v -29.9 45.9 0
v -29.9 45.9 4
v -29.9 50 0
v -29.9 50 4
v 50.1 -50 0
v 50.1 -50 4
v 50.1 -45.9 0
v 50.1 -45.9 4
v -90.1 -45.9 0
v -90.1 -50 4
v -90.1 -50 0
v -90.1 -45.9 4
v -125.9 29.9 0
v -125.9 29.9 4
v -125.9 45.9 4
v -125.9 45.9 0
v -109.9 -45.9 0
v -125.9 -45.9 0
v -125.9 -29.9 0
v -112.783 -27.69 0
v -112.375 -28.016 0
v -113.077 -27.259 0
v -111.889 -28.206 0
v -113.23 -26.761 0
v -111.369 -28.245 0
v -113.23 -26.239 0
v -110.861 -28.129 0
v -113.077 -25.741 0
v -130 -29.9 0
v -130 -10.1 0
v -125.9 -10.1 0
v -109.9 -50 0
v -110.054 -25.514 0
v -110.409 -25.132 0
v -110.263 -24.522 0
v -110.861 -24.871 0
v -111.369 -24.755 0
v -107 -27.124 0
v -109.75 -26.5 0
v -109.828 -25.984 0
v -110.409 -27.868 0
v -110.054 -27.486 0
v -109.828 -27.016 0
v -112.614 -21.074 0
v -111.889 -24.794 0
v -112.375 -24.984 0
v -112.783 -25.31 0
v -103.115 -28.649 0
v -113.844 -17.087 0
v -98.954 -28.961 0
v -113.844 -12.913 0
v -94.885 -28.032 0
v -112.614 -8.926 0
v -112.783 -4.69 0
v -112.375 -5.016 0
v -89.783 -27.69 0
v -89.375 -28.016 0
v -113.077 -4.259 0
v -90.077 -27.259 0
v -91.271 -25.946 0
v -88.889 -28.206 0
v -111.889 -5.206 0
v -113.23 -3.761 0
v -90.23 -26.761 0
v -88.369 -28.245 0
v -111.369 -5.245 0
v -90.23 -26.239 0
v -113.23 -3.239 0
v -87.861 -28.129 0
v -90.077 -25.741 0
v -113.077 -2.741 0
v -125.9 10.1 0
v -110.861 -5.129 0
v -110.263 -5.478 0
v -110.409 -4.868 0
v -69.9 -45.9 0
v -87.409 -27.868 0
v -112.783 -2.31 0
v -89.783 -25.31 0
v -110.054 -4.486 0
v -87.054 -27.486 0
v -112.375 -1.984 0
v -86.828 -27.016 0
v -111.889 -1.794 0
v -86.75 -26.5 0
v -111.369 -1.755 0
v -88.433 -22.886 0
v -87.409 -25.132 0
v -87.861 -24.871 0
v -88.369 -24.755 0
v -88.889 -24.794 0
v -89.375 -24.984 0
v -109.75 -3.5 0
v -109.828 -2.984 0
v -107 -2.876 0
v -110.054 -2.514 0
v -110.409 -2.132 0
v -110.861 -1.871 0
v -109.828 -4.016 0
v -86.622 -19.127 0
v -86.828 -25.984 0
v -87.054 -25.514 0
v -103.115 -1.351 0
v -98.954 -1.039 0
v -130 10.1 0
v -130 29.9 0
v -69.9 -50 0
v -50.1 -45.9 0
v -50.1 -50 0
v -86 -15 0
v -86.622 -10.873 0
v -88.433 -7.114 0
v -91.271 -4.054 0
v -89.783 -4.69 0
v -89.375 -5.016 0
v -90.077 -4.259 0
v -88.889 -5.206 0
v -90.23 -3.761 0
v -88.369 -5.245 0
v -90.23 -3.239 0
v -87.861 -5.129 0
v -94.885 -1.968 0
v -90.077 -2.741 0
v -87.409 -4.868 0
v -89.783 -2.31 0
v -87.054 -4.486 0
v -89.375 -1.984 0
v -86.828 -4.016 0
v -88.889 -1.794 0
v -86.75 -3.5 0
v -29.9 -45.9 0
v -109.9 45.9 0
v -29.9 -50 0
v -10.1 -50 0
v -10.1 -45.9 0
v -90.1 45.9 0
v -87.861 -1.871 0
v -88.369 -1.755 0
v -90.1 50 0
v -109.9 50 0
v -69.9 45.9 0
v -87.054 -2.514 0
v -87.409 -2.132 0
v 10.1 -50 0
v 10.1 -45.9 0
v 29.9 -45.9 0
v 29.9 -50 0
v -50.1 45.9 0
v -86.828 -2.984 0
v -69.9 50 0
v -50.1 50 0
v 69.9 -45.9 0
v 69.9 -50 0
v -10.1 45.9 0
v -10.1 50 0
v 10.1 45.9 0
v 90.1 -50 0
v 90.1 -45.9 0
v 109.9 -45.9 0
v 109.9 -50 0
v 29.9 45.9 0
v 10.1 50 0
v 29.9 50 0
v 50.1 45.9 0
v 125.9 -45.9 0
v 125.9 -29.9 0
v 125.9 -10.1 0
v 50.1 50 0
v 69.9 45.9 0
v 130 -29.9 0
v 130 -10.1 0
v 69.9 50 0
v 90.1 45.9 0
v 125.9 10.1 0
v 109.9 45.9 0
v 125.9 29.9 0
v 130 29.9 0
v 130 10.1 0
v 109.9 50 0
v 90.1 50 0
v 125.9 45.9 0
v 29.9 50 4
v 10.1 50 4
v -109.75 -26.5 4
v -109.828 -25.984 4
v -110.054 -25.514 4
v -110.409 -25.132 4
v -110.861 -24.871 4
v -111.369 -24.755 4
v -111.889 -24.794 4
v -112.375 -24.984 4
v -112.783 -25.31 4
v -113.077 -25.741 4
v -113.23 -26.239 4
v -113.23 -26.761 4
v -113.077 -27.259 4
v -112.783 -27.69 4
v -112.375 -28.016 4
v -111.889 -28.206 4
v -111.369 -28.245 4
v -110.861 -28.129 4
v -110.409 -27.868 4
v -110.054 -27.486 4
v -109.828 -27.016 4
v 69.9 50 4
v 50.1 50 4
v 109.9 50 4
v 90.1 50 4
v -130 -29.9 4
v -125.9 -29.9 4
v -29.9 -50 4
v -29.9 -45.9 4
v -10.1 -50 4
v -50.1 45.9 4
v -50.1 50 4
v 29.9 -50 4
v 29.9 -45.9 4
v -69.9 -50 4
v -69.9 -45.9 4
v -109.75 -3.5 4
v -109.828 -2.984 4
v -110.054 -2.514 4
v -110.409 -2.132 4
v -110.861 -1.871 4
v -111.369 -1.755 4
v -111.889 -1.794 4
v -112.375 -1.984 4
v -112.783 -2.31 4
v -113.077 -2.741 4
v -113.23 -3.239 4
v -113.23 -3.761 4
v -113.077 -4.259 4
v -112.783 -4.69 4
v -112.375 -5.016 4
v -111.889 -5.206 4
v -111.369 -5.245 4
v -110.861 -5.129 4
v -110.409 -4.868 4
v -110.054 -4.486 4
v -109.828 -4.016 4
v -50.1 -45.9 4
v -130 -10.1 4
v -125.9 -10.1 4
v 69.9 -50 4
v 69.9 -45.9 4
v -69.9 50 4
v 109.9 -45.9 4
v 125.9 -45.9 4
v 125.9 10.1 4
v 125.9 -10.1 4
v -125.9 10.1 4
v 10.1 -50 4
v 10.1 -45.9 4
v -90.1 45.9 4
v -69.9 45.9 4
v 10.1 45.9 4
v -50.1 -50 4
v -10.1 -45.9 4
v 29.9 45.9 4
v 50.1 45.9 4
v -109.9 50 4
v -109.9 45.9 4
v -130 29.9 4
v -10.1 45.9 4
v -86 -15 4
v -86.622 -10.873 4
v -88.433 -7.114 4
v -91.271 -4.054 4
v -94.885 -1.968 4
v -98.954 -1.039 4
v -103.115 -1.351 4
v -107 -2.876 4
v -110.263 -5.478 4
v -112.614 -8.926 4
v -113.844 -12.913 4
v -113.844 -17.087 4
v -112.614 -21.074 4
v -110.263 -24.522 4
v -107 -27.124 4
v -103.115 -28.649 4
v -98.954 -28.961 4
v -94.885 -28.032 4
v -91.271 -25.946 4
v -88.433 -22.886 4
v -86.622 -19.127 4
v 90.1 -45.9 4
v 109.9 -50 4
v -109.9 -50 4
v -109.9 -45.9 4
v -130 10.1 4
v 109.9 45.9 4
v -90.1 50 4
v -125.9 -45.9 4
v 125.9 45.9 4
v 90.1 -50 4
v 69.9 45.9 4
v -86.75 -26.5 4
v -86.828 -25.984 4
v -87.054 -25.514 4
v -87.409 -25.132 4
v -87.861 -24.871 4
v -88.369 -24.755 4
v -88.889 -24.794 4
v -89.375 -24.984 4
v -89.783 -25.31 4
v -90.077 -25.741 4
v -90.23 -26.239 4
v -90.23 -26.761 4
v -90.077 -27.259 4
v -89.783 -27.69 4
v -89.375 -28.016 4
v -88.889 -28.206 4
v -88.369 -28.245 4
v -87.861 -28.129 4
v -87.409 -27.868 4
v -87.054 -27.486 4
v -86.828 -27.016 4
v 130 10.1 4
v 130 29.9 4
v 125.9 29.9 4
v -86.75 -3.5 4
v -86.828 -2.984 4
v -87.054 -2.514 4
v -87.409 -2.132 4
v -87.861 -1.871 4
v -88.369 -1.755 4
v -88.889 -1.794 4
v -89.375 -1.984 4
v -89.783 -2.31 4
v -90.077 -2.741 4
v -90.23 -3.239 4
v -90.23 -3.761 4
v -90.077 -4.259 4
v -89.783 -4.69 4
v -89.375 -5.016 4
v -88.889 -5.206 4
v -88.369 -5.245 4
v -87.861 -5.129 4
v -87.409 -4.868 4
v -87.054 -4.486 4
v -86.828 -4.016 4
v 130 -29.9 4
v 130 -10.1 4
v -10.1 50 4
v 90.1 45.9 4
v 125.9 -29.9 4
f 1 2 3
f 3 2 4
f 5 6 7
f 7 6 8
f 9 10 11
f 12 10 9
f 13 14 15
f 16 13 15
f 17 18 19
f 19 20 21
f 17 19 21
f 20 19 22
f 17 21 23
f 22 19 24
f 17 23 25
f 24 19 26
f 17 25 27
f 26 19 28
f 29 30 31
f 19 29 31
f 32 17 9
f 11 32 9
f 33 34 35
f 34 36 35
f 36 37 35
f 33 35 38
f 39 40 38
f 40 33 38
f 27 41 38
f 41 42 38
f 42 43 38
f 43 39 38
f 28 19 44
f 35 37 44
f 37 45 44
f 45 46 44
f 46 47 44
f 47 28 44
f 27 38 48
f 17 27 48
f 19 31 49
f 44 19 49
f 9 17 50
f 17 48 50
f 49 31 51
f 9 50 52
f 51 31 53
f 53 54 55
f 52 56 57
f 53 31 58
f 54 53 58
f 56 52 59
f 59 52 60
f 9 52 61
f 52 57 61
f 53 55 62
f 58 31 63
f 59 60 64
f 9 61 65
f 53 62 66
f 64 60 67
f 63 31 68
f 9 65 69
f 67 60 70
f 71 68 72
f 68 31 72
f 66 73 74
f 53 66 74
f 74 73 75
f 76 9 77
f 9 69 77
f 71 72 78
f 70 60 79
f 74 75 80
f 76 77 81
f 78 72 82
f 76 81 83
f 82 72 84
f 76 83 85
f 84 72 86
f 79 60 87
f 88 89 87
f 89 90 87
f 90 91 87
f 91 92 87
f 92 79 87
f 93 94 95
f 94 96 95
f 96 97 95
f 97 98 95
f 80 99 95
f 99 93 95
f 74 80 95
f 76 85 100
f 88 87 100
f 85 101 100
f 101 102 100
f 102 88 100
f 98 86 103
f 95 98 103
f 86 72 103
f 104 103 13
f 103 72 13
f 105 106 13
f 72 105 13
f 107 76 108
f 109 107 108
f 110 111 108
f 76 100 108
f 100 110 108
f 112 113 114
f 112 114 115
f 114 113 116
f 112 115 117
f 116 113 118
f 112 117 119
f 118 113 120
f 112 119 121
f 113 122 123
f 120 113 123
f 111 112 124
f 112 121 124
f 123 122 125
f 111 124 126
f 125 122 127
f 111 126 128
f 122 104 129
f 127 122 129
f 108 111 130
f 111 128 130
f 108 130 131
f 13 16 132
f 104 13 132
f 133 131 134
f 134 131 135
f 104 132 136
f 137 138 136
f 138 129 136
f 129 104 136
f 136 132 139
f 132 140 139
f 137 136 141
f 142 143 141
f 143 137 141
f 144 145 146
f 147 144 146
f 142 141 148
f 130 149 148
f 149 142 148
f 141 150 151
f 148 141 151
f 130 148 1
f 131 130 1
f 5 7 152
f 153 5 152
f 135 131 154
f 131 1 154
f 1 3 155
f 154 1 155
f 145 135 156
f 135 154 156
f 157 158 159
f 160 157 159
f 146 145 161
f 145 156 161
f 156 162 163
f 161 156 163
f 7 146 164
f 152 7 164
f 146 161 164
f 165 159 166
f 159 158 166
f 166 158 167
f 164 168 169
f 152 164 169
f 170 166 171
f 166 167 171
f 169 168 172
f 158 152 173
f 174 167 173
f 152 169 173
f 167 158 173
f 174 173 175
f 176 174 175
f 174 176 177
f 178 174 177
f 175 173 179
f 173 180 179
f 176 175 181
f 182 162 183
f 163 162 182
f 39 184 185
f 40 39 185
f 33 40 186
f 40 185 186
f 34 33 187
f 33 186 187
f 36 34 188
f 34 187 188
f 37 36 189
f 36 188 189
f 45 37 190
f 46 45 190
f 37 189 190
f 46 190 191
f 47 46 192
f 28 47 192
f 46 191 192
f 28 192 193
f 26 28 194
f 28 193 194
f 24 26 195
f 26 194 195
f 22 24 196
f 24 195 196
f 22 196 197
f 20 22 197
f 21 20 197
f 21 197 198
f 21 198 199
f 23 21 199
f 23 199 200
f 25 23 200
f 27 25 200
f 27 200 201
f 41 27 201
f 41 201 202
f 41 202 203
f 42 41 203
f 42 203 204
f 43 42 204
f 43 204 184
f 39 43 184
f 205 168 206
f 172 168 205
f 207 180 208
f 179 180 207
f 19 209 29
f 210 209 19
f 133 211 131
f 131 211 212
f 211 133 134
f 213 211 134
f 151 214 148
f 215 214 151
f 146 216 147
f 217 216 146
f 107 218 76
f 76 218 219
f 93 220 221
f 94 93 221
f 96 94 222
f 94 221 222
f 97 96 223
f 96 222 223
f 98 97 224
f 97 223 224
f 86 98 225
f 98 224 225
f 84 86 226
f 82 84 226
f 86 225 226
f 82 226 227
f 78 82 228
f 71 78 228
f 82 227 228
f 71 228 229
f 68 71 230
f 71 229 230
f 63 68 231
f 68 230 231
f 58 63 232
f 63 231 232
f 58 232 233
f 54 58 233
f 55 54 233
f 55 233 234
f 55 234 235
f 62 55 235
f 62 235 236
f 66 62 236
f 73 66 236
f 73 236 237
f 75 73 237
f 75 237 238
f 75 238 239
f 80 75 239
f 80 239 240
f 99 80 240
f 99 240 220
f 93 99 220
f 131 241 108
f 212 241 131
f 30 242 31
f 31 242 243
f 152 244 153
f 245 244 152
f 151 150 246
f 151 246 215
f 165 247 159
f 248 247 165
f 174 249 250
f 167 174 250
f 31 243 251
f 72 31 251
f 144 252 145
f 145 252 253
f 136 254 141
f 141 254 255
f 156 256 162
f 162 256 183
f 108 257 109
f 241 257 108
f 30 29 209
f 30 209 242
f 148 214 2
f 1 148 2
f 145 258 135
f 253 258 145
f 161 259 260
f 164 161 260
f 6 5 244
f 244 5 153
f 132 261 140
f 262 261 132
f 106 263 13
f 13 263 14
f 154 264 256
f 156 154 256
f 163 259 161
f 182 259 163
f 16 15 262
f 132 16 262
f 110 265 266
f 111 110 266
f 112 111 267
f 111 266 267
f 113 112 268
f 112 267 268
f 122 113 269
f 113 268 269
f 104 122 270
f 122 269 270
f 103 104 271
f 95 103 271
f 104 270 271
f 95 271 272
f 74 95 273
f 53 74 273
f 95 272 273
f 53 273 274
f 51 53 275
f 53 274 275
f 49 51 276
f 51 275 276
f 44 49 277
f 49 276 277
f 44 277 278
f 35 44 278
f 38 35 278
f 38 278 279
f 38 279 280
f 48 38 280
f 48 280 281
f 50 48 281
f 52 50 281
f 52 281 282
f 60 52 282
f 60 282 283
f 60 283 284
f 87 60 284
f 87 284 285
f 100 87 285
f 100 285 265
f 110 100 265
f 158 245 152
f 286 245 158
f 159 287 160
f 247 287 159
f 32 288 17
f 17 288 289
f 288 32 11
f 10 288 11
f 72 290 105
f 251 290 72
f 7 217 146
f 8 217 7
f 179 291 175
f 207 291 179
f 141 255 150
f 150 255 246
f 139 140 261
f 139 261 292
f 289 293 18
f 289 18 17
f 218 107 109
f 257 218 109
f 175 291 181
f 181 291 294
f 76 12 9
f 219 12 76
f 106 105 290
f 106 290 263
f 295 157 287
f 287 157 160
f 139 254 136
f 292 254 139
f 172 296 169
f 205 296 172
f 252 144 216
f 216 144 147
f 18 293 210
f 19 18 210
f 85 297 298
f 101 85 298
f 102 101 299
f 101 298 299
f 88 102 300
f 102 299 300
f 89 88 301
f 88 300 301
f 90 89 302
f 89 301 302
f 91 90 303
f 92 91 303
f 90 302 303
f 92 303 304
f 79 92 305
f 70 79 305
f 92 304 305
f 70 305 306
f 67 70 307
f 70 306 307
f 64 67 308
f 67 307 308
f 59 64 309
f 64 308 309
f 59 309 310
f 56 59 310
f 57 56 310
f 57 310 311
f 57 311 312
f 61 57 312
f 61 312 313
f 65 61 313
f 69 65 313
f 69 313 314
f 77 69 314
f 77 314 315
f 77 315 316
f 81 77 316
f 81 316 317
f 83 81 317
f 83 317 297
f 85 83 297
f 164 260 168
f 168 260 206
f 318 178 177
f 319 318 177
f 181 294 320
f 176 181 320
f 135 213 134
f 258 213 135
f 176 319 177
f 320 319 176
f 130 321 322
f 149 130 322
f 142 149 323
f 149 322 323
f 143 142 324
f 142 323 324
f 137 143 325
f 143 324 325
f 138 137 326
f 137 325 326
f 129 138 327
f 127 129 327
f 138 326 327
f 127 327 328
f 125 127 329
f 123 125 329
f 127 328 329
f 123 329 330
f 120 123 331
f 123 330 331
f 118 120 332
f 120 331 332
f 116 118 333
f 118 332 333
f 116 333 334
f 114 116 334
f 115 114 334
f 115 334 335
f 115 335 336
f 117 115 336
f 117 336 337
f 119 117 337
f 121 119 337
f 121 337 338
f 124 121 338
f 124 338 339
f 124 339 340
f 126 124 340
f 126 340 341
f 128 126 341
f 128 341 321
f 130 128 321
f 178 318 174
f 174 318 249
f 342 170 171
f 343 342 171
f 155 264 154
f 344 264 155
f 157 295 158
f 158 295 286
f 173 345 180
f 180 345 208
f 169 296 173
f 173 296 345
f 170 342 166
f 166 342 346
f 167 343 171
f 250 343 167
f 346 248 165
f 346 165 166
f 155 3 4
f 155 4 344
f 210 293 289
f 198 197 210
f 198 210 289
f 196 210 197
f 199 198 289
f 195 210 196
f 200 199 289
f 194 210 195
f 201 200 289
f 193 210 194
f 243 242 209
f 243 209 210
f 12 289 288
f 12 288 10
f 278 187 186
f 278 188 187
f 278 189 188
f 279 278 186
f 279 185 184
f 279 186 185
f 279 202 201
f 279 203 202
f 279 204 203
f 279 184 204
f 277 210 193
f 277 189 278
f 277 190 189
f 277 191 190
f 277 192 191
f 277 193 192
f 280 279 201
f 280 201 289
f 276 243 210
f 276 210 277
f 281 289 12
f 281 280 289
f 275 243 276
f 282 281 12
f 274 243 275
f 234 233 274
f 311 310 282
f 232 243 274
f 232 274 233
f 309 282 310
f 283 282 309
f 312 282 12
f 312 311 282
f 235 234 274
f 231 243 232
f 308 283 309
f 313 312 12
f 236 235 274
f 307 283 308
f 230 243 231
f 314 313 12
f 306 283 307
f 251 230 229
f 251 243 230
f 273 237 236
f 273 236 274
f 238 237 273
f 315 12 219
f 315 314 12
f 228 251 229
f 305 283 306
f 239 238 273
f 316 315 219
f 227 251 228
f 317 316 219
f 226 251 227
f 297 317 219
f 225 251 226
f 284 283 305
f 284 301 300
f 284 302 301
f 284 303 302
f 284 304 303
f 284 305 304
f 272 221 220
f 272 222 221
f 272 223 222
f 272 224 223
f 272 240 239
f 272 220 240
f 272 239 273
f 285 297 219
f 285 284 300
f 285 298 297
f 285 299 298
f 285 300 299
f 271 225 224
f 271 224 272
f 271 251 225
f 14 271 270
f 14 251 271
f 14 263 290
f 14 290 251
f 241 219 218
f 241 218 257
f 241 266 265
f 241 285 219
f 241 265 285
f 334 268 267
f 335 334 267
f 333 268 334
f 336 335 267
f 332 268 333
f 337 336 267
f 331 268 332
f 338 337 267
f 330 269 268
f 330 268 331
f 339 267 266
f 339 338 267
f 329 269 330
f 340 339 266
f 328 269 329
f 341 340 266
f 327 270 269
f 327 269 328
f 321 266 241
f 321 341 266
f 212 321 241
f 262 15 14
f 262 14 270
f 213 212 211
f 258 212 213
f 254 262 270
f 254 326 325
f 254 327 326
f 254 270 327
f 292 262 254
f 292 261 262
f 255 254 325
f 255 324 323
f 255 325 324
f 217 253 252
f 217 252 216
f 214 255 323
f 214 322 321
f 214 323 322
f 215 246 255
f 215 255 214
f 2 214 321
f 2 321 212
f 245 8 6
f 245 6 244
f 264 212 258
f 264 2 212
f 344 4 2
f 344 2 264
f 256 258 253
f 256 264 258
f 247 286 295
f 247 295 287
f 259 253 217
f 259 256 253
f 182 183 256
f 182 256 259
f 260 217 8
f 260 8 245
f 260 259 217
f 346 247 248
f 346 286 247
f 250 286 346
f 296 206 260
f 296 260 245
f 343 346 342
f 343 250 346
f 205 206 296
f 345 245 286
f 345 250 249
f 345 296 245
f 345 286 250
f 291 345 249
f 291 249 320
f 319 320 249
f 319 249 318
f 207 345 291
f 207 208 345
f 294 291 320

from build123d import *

# Parameters (mm, degrees)
SKETCH2_W               = 260
SKETCH2_H               = 100
BOSS_EXTRUDE1_DEPTH     = 4
SKETCH3_W               = 4.1
SKETCH3_H               = 20.2
CUT_EXTRUDE1_DEPTH      = 4
LPATTERN1_COUNT         = 3
LPATTERN1_PITCH         = 40
MIRROR1_COPY_1_SKETCH_W = 4.1
MIRROR1_COPY_1_SKETCH_H = 20.2
MIRROR1_COPY_1_DEPTH    = 4
MIRROR1_COPY_2_SKETCH_W = 4.1
MIRROR1_COPY_2_SKETCH_H = 20.2
MIRROR1_COPY_2_DEPTH    = 4
SKETCH4_W               = 20.2
SKETCH4_H               = 4.1
CUT_EXTRUDE2_DEPTH      = 4
LPATTERN2_COUNT         = 7
LPATTERN2_PITCH         = 40
MIRROR2_COPY_1_SKETCH_W = 20.2
MIRROR2_COPY_1_SKETCH_H = 4.1
MIRROR2_COPY_1_DEPTH    = 4
MIRROR2_COPY_2_SKETCH_W = 20.2
MIRROR2_COPY_2_SKETCH_H = 4.1
MIRROR2_COPY_2_DEPTH    = 4
MIRROR2_COPY_3_SKETCH_W = 20.2
MIRROR2_COPY_3_SKETCH_H = 4.1
MIRROR2_COPY_3_DEPTH    = 4
MIRROR2_COPY_4_SKETCH_W = 20.2
MIRROR2_COPY_4_SKETCH_H = 4.1
MIRROR2_COPY_4_DEPTH    = 4
MIRROR2_COPY_5_SKETCH_W = 20.2
MIRROR2_COPY_5_SKETCH_H = 4.1
MIRROR2_COPY_5_DEPTH    = 4
MIRROR2_COPY_6_SKETCH_W = 20.2
MIRROR2_COPY_6_SKETCH_H = 4.1
MIRROR2_COPY_6_DEPTH    = 4
SKETCH5_R               = 14
SKETCH5_R_2             = 1.75
CUT_EXTRUDE3_DEPTH      = 5


with BuildPart() as part:
    # Sketch2 → Boss-Extrude1 (new body)
    with BuildSketch(Plane.XY):
        Rectangle(SKETCH2_W, SKETCH2_H)
    extrude(amount=BOSS_EXTRUDE1_DEPTH)

    # Sketch3 → Cut-Extrude1 (cut)
    with BuildSketch(Plane.XY.offset(4)):
        with Locations((-127.95, -40)):
            Rectangle(SKETCH3_W, SKETCH3_H)
    cut_extrude1 = extrude(amount=-CUT_EXTRUDE1_DEPTH, mode=Mode.SUBTRACT)

    # LPattern1: Cut-Extrude1 ×3
    with Locations(*[(0, i * LPATTERN1_PITCH, 0) for i in range(1, LPATTERN1_COUNT)]):
        add(cut_extrude1, mode=Mode.SUBTRACT)

    # Mirror1: Cut-Extrude1 across plane
    add(cut_extrude1.mirror(Plane(origin=(0, 0, 0), x_dir=(0, 0, 1), z_dir=(1, 0, 0))), mode=Mode.SUBTRACT)

    # Mirror1 copy 1 sketch → Mirror1 copy 1 (cut)
    with BuildSketch(Plane(origin=(0, 40, 4), x_dir=(-1, 0, 0), z_dir=(0, 0, 1))):
        with Locations((-127.95, 40)):
            Rectangle(MIRROR1_COPY_1_SKETCH_W, MIRROR1_COPY_1_SKETCH_H)
    extrude(amount=-MIRROR1_COPY_1_DEPTH, mode=Mode.SUBTRACT)

    # Mirror1 copy 2 sketch → Mirror1 copy 2 (cut)
    with BuildSketch(Plane(origin=(0, 80, 4), x_dir=(-1, 0, 0), z_dir=(0, 0, 1))):
        with Locations((-127.95, 40)):
            Rectangle(MIRROR1_COPY_2_SKETCH_W, MIRROR1_COPY_2_SKETCH_H)
    extrude(amount=-MIRROR1_COPY_2_DEPTH, mode=Mode.SUBTRACT)

    # Sketch4 → Cut-Extrude2 (cut)
    with BuildSketch(Plane.XY.offset(4)):
        with Locations((-120, -47.95)):
            Rectangle(SKETCH4_W, SKETCH4_H)
    cut_extrude2 = extrude(amount=-CUT_EXTRUDE2_DEPTH, mode=Mode.SUBTRACT)

    # LPattern2: Cut-Extrude2 ×7
    with Locations(*[(i * LPATTERN2_PITCH, 0, 0) for i in range(1, LPATTERN2_COUNT)]):
        add(cut_extrude2, mode=Mode.SUBTRACT)

    # Mirror2: Cut-Extrude2 across plane
    add(cut_extrude2.mirror(Plane.ZX), mode=Mode.SUBTRACT)

    # Mirror2 copy 1 sketch → Mirror2 copy 1 (cut)
    with BuildSketch(Plane(origin=(40, 0, 4), x_dir=(1, 0, 0), z_dir=(0, 0, 1))):
        with Locations((-120, 47.95)):
            Rectangle(MIRROR2_COPY_1_SKETCH_W, MIRROR2_COPY_1_SKETCH_H)
    extrude(amount=-MIRROR2_COPY_1_DEPTH, mode=Mode.SUBTRACT)

    # Mirror2 copy 2 sketch → Mirror2 copy 2 (cut)
    with BuildSketch(Plane(origin=(80, 0, 4), x_dir=(1, 0, 0), z_dir=(0, 0, 1))):
        with Locations((-120, 47.95)):
            Rectangle(MIRROR2_COPY_2_SKETCH_W, MIRROR2_COPY_2_SKETCH_H)
    extrude(amount=-MIRROR2_COPY_2_DEPTH, mode=Mode.SUBTRACT)

    # Mirror2 copy 3 sketch → Mirror2 copy 3 (cut)
    with BuildSketch(Plane(origin=(120, 0, 4), x_dir=(1, 0, 0), z_dir=(0, 0, 1))):
        with Locations((-120, 47.95)):
            Rectangle(MIRROR2_COPY_3_SKETCH_W, MIRROR2_COPY_3_SKETCH_H)
    extrude(amount=-MIRROR2_COPY_3_DEPTH, mode=Mode.SUBTRACT)

    # Mirror2 copy 4 sketch → Mirror2 copy 4 (cut)
    with BuildSketch(Plane(origin=(160, 0, 4), x_dir=(1, 0, 0), z_dir=(0, 0, 1))):
        with Locations((-120, 47.95)):
            Rectangle(MIRROR2_COPY_4_SKETCH_W, MIRROR2_COPY_4_SKETCH_H)
    extrude(amount=-MIRROR2_COPY_4_DEPTH, mode=Mode.SUBTRACT)

    # Mirror2 copy 5 sketch → Mirror2 copy 5 (cut)
    with BuildSketch(Plane(origin=(200, 0, 4), x_dir=(1, 0, 0), z_dir=(0, 0, 1))):
        with Locations((-120, 47.95)):
            Rectangle(MIRROR2_COPY_5_SKETCH_W, MIRROR2_COPY_5_SKETCH_H)
    extrude(amount=-MIRROR2_COPY_5_DEPTH, mode=Mode.SUBTRACT)

    # Mirror2 copy 6 sketch → Mirror2 copy 6 (cut)
    with BuildSketch(Plane(origin=(240, 0, 4), x_dir=(1, 0, 0), z_dir=(0, 0, 1))):
        with Locations((-120, 47.95)):
            Rectangle(MIRROR2_COPY_6_SKETCH_W, MIRROR2_COPY_6_SKETCH_H)
    extrude(amount=-MIRROR2_COPY_6_DEPTH, mode=Mode.SUBTRACT)

    # Sketch5 → Cut-Extrude3 (cut, through all)
    with BuildSketch(Plane.XY.offset(4)):
        with Locations((-100, -15)):
            Circle(SKETCH5_R)
        with Locations((-111.5, -3.5)):
            Circle(SKETCH5_R_2)
        with Locations((-88.5, -3.5)):
            Circle(SKETCH5_R_2)
        with Locations((-111.5, -26.5)):
            Circle(SKETCH5_R_2)
        with Locations((-88.5, -26.5)):
            Circle(SKETCH5_R_2)
    extrude(amount=-CUT_EXTRUDE3_DEPTH, mode=Mode.SUBTRACT)


solid = part.part
